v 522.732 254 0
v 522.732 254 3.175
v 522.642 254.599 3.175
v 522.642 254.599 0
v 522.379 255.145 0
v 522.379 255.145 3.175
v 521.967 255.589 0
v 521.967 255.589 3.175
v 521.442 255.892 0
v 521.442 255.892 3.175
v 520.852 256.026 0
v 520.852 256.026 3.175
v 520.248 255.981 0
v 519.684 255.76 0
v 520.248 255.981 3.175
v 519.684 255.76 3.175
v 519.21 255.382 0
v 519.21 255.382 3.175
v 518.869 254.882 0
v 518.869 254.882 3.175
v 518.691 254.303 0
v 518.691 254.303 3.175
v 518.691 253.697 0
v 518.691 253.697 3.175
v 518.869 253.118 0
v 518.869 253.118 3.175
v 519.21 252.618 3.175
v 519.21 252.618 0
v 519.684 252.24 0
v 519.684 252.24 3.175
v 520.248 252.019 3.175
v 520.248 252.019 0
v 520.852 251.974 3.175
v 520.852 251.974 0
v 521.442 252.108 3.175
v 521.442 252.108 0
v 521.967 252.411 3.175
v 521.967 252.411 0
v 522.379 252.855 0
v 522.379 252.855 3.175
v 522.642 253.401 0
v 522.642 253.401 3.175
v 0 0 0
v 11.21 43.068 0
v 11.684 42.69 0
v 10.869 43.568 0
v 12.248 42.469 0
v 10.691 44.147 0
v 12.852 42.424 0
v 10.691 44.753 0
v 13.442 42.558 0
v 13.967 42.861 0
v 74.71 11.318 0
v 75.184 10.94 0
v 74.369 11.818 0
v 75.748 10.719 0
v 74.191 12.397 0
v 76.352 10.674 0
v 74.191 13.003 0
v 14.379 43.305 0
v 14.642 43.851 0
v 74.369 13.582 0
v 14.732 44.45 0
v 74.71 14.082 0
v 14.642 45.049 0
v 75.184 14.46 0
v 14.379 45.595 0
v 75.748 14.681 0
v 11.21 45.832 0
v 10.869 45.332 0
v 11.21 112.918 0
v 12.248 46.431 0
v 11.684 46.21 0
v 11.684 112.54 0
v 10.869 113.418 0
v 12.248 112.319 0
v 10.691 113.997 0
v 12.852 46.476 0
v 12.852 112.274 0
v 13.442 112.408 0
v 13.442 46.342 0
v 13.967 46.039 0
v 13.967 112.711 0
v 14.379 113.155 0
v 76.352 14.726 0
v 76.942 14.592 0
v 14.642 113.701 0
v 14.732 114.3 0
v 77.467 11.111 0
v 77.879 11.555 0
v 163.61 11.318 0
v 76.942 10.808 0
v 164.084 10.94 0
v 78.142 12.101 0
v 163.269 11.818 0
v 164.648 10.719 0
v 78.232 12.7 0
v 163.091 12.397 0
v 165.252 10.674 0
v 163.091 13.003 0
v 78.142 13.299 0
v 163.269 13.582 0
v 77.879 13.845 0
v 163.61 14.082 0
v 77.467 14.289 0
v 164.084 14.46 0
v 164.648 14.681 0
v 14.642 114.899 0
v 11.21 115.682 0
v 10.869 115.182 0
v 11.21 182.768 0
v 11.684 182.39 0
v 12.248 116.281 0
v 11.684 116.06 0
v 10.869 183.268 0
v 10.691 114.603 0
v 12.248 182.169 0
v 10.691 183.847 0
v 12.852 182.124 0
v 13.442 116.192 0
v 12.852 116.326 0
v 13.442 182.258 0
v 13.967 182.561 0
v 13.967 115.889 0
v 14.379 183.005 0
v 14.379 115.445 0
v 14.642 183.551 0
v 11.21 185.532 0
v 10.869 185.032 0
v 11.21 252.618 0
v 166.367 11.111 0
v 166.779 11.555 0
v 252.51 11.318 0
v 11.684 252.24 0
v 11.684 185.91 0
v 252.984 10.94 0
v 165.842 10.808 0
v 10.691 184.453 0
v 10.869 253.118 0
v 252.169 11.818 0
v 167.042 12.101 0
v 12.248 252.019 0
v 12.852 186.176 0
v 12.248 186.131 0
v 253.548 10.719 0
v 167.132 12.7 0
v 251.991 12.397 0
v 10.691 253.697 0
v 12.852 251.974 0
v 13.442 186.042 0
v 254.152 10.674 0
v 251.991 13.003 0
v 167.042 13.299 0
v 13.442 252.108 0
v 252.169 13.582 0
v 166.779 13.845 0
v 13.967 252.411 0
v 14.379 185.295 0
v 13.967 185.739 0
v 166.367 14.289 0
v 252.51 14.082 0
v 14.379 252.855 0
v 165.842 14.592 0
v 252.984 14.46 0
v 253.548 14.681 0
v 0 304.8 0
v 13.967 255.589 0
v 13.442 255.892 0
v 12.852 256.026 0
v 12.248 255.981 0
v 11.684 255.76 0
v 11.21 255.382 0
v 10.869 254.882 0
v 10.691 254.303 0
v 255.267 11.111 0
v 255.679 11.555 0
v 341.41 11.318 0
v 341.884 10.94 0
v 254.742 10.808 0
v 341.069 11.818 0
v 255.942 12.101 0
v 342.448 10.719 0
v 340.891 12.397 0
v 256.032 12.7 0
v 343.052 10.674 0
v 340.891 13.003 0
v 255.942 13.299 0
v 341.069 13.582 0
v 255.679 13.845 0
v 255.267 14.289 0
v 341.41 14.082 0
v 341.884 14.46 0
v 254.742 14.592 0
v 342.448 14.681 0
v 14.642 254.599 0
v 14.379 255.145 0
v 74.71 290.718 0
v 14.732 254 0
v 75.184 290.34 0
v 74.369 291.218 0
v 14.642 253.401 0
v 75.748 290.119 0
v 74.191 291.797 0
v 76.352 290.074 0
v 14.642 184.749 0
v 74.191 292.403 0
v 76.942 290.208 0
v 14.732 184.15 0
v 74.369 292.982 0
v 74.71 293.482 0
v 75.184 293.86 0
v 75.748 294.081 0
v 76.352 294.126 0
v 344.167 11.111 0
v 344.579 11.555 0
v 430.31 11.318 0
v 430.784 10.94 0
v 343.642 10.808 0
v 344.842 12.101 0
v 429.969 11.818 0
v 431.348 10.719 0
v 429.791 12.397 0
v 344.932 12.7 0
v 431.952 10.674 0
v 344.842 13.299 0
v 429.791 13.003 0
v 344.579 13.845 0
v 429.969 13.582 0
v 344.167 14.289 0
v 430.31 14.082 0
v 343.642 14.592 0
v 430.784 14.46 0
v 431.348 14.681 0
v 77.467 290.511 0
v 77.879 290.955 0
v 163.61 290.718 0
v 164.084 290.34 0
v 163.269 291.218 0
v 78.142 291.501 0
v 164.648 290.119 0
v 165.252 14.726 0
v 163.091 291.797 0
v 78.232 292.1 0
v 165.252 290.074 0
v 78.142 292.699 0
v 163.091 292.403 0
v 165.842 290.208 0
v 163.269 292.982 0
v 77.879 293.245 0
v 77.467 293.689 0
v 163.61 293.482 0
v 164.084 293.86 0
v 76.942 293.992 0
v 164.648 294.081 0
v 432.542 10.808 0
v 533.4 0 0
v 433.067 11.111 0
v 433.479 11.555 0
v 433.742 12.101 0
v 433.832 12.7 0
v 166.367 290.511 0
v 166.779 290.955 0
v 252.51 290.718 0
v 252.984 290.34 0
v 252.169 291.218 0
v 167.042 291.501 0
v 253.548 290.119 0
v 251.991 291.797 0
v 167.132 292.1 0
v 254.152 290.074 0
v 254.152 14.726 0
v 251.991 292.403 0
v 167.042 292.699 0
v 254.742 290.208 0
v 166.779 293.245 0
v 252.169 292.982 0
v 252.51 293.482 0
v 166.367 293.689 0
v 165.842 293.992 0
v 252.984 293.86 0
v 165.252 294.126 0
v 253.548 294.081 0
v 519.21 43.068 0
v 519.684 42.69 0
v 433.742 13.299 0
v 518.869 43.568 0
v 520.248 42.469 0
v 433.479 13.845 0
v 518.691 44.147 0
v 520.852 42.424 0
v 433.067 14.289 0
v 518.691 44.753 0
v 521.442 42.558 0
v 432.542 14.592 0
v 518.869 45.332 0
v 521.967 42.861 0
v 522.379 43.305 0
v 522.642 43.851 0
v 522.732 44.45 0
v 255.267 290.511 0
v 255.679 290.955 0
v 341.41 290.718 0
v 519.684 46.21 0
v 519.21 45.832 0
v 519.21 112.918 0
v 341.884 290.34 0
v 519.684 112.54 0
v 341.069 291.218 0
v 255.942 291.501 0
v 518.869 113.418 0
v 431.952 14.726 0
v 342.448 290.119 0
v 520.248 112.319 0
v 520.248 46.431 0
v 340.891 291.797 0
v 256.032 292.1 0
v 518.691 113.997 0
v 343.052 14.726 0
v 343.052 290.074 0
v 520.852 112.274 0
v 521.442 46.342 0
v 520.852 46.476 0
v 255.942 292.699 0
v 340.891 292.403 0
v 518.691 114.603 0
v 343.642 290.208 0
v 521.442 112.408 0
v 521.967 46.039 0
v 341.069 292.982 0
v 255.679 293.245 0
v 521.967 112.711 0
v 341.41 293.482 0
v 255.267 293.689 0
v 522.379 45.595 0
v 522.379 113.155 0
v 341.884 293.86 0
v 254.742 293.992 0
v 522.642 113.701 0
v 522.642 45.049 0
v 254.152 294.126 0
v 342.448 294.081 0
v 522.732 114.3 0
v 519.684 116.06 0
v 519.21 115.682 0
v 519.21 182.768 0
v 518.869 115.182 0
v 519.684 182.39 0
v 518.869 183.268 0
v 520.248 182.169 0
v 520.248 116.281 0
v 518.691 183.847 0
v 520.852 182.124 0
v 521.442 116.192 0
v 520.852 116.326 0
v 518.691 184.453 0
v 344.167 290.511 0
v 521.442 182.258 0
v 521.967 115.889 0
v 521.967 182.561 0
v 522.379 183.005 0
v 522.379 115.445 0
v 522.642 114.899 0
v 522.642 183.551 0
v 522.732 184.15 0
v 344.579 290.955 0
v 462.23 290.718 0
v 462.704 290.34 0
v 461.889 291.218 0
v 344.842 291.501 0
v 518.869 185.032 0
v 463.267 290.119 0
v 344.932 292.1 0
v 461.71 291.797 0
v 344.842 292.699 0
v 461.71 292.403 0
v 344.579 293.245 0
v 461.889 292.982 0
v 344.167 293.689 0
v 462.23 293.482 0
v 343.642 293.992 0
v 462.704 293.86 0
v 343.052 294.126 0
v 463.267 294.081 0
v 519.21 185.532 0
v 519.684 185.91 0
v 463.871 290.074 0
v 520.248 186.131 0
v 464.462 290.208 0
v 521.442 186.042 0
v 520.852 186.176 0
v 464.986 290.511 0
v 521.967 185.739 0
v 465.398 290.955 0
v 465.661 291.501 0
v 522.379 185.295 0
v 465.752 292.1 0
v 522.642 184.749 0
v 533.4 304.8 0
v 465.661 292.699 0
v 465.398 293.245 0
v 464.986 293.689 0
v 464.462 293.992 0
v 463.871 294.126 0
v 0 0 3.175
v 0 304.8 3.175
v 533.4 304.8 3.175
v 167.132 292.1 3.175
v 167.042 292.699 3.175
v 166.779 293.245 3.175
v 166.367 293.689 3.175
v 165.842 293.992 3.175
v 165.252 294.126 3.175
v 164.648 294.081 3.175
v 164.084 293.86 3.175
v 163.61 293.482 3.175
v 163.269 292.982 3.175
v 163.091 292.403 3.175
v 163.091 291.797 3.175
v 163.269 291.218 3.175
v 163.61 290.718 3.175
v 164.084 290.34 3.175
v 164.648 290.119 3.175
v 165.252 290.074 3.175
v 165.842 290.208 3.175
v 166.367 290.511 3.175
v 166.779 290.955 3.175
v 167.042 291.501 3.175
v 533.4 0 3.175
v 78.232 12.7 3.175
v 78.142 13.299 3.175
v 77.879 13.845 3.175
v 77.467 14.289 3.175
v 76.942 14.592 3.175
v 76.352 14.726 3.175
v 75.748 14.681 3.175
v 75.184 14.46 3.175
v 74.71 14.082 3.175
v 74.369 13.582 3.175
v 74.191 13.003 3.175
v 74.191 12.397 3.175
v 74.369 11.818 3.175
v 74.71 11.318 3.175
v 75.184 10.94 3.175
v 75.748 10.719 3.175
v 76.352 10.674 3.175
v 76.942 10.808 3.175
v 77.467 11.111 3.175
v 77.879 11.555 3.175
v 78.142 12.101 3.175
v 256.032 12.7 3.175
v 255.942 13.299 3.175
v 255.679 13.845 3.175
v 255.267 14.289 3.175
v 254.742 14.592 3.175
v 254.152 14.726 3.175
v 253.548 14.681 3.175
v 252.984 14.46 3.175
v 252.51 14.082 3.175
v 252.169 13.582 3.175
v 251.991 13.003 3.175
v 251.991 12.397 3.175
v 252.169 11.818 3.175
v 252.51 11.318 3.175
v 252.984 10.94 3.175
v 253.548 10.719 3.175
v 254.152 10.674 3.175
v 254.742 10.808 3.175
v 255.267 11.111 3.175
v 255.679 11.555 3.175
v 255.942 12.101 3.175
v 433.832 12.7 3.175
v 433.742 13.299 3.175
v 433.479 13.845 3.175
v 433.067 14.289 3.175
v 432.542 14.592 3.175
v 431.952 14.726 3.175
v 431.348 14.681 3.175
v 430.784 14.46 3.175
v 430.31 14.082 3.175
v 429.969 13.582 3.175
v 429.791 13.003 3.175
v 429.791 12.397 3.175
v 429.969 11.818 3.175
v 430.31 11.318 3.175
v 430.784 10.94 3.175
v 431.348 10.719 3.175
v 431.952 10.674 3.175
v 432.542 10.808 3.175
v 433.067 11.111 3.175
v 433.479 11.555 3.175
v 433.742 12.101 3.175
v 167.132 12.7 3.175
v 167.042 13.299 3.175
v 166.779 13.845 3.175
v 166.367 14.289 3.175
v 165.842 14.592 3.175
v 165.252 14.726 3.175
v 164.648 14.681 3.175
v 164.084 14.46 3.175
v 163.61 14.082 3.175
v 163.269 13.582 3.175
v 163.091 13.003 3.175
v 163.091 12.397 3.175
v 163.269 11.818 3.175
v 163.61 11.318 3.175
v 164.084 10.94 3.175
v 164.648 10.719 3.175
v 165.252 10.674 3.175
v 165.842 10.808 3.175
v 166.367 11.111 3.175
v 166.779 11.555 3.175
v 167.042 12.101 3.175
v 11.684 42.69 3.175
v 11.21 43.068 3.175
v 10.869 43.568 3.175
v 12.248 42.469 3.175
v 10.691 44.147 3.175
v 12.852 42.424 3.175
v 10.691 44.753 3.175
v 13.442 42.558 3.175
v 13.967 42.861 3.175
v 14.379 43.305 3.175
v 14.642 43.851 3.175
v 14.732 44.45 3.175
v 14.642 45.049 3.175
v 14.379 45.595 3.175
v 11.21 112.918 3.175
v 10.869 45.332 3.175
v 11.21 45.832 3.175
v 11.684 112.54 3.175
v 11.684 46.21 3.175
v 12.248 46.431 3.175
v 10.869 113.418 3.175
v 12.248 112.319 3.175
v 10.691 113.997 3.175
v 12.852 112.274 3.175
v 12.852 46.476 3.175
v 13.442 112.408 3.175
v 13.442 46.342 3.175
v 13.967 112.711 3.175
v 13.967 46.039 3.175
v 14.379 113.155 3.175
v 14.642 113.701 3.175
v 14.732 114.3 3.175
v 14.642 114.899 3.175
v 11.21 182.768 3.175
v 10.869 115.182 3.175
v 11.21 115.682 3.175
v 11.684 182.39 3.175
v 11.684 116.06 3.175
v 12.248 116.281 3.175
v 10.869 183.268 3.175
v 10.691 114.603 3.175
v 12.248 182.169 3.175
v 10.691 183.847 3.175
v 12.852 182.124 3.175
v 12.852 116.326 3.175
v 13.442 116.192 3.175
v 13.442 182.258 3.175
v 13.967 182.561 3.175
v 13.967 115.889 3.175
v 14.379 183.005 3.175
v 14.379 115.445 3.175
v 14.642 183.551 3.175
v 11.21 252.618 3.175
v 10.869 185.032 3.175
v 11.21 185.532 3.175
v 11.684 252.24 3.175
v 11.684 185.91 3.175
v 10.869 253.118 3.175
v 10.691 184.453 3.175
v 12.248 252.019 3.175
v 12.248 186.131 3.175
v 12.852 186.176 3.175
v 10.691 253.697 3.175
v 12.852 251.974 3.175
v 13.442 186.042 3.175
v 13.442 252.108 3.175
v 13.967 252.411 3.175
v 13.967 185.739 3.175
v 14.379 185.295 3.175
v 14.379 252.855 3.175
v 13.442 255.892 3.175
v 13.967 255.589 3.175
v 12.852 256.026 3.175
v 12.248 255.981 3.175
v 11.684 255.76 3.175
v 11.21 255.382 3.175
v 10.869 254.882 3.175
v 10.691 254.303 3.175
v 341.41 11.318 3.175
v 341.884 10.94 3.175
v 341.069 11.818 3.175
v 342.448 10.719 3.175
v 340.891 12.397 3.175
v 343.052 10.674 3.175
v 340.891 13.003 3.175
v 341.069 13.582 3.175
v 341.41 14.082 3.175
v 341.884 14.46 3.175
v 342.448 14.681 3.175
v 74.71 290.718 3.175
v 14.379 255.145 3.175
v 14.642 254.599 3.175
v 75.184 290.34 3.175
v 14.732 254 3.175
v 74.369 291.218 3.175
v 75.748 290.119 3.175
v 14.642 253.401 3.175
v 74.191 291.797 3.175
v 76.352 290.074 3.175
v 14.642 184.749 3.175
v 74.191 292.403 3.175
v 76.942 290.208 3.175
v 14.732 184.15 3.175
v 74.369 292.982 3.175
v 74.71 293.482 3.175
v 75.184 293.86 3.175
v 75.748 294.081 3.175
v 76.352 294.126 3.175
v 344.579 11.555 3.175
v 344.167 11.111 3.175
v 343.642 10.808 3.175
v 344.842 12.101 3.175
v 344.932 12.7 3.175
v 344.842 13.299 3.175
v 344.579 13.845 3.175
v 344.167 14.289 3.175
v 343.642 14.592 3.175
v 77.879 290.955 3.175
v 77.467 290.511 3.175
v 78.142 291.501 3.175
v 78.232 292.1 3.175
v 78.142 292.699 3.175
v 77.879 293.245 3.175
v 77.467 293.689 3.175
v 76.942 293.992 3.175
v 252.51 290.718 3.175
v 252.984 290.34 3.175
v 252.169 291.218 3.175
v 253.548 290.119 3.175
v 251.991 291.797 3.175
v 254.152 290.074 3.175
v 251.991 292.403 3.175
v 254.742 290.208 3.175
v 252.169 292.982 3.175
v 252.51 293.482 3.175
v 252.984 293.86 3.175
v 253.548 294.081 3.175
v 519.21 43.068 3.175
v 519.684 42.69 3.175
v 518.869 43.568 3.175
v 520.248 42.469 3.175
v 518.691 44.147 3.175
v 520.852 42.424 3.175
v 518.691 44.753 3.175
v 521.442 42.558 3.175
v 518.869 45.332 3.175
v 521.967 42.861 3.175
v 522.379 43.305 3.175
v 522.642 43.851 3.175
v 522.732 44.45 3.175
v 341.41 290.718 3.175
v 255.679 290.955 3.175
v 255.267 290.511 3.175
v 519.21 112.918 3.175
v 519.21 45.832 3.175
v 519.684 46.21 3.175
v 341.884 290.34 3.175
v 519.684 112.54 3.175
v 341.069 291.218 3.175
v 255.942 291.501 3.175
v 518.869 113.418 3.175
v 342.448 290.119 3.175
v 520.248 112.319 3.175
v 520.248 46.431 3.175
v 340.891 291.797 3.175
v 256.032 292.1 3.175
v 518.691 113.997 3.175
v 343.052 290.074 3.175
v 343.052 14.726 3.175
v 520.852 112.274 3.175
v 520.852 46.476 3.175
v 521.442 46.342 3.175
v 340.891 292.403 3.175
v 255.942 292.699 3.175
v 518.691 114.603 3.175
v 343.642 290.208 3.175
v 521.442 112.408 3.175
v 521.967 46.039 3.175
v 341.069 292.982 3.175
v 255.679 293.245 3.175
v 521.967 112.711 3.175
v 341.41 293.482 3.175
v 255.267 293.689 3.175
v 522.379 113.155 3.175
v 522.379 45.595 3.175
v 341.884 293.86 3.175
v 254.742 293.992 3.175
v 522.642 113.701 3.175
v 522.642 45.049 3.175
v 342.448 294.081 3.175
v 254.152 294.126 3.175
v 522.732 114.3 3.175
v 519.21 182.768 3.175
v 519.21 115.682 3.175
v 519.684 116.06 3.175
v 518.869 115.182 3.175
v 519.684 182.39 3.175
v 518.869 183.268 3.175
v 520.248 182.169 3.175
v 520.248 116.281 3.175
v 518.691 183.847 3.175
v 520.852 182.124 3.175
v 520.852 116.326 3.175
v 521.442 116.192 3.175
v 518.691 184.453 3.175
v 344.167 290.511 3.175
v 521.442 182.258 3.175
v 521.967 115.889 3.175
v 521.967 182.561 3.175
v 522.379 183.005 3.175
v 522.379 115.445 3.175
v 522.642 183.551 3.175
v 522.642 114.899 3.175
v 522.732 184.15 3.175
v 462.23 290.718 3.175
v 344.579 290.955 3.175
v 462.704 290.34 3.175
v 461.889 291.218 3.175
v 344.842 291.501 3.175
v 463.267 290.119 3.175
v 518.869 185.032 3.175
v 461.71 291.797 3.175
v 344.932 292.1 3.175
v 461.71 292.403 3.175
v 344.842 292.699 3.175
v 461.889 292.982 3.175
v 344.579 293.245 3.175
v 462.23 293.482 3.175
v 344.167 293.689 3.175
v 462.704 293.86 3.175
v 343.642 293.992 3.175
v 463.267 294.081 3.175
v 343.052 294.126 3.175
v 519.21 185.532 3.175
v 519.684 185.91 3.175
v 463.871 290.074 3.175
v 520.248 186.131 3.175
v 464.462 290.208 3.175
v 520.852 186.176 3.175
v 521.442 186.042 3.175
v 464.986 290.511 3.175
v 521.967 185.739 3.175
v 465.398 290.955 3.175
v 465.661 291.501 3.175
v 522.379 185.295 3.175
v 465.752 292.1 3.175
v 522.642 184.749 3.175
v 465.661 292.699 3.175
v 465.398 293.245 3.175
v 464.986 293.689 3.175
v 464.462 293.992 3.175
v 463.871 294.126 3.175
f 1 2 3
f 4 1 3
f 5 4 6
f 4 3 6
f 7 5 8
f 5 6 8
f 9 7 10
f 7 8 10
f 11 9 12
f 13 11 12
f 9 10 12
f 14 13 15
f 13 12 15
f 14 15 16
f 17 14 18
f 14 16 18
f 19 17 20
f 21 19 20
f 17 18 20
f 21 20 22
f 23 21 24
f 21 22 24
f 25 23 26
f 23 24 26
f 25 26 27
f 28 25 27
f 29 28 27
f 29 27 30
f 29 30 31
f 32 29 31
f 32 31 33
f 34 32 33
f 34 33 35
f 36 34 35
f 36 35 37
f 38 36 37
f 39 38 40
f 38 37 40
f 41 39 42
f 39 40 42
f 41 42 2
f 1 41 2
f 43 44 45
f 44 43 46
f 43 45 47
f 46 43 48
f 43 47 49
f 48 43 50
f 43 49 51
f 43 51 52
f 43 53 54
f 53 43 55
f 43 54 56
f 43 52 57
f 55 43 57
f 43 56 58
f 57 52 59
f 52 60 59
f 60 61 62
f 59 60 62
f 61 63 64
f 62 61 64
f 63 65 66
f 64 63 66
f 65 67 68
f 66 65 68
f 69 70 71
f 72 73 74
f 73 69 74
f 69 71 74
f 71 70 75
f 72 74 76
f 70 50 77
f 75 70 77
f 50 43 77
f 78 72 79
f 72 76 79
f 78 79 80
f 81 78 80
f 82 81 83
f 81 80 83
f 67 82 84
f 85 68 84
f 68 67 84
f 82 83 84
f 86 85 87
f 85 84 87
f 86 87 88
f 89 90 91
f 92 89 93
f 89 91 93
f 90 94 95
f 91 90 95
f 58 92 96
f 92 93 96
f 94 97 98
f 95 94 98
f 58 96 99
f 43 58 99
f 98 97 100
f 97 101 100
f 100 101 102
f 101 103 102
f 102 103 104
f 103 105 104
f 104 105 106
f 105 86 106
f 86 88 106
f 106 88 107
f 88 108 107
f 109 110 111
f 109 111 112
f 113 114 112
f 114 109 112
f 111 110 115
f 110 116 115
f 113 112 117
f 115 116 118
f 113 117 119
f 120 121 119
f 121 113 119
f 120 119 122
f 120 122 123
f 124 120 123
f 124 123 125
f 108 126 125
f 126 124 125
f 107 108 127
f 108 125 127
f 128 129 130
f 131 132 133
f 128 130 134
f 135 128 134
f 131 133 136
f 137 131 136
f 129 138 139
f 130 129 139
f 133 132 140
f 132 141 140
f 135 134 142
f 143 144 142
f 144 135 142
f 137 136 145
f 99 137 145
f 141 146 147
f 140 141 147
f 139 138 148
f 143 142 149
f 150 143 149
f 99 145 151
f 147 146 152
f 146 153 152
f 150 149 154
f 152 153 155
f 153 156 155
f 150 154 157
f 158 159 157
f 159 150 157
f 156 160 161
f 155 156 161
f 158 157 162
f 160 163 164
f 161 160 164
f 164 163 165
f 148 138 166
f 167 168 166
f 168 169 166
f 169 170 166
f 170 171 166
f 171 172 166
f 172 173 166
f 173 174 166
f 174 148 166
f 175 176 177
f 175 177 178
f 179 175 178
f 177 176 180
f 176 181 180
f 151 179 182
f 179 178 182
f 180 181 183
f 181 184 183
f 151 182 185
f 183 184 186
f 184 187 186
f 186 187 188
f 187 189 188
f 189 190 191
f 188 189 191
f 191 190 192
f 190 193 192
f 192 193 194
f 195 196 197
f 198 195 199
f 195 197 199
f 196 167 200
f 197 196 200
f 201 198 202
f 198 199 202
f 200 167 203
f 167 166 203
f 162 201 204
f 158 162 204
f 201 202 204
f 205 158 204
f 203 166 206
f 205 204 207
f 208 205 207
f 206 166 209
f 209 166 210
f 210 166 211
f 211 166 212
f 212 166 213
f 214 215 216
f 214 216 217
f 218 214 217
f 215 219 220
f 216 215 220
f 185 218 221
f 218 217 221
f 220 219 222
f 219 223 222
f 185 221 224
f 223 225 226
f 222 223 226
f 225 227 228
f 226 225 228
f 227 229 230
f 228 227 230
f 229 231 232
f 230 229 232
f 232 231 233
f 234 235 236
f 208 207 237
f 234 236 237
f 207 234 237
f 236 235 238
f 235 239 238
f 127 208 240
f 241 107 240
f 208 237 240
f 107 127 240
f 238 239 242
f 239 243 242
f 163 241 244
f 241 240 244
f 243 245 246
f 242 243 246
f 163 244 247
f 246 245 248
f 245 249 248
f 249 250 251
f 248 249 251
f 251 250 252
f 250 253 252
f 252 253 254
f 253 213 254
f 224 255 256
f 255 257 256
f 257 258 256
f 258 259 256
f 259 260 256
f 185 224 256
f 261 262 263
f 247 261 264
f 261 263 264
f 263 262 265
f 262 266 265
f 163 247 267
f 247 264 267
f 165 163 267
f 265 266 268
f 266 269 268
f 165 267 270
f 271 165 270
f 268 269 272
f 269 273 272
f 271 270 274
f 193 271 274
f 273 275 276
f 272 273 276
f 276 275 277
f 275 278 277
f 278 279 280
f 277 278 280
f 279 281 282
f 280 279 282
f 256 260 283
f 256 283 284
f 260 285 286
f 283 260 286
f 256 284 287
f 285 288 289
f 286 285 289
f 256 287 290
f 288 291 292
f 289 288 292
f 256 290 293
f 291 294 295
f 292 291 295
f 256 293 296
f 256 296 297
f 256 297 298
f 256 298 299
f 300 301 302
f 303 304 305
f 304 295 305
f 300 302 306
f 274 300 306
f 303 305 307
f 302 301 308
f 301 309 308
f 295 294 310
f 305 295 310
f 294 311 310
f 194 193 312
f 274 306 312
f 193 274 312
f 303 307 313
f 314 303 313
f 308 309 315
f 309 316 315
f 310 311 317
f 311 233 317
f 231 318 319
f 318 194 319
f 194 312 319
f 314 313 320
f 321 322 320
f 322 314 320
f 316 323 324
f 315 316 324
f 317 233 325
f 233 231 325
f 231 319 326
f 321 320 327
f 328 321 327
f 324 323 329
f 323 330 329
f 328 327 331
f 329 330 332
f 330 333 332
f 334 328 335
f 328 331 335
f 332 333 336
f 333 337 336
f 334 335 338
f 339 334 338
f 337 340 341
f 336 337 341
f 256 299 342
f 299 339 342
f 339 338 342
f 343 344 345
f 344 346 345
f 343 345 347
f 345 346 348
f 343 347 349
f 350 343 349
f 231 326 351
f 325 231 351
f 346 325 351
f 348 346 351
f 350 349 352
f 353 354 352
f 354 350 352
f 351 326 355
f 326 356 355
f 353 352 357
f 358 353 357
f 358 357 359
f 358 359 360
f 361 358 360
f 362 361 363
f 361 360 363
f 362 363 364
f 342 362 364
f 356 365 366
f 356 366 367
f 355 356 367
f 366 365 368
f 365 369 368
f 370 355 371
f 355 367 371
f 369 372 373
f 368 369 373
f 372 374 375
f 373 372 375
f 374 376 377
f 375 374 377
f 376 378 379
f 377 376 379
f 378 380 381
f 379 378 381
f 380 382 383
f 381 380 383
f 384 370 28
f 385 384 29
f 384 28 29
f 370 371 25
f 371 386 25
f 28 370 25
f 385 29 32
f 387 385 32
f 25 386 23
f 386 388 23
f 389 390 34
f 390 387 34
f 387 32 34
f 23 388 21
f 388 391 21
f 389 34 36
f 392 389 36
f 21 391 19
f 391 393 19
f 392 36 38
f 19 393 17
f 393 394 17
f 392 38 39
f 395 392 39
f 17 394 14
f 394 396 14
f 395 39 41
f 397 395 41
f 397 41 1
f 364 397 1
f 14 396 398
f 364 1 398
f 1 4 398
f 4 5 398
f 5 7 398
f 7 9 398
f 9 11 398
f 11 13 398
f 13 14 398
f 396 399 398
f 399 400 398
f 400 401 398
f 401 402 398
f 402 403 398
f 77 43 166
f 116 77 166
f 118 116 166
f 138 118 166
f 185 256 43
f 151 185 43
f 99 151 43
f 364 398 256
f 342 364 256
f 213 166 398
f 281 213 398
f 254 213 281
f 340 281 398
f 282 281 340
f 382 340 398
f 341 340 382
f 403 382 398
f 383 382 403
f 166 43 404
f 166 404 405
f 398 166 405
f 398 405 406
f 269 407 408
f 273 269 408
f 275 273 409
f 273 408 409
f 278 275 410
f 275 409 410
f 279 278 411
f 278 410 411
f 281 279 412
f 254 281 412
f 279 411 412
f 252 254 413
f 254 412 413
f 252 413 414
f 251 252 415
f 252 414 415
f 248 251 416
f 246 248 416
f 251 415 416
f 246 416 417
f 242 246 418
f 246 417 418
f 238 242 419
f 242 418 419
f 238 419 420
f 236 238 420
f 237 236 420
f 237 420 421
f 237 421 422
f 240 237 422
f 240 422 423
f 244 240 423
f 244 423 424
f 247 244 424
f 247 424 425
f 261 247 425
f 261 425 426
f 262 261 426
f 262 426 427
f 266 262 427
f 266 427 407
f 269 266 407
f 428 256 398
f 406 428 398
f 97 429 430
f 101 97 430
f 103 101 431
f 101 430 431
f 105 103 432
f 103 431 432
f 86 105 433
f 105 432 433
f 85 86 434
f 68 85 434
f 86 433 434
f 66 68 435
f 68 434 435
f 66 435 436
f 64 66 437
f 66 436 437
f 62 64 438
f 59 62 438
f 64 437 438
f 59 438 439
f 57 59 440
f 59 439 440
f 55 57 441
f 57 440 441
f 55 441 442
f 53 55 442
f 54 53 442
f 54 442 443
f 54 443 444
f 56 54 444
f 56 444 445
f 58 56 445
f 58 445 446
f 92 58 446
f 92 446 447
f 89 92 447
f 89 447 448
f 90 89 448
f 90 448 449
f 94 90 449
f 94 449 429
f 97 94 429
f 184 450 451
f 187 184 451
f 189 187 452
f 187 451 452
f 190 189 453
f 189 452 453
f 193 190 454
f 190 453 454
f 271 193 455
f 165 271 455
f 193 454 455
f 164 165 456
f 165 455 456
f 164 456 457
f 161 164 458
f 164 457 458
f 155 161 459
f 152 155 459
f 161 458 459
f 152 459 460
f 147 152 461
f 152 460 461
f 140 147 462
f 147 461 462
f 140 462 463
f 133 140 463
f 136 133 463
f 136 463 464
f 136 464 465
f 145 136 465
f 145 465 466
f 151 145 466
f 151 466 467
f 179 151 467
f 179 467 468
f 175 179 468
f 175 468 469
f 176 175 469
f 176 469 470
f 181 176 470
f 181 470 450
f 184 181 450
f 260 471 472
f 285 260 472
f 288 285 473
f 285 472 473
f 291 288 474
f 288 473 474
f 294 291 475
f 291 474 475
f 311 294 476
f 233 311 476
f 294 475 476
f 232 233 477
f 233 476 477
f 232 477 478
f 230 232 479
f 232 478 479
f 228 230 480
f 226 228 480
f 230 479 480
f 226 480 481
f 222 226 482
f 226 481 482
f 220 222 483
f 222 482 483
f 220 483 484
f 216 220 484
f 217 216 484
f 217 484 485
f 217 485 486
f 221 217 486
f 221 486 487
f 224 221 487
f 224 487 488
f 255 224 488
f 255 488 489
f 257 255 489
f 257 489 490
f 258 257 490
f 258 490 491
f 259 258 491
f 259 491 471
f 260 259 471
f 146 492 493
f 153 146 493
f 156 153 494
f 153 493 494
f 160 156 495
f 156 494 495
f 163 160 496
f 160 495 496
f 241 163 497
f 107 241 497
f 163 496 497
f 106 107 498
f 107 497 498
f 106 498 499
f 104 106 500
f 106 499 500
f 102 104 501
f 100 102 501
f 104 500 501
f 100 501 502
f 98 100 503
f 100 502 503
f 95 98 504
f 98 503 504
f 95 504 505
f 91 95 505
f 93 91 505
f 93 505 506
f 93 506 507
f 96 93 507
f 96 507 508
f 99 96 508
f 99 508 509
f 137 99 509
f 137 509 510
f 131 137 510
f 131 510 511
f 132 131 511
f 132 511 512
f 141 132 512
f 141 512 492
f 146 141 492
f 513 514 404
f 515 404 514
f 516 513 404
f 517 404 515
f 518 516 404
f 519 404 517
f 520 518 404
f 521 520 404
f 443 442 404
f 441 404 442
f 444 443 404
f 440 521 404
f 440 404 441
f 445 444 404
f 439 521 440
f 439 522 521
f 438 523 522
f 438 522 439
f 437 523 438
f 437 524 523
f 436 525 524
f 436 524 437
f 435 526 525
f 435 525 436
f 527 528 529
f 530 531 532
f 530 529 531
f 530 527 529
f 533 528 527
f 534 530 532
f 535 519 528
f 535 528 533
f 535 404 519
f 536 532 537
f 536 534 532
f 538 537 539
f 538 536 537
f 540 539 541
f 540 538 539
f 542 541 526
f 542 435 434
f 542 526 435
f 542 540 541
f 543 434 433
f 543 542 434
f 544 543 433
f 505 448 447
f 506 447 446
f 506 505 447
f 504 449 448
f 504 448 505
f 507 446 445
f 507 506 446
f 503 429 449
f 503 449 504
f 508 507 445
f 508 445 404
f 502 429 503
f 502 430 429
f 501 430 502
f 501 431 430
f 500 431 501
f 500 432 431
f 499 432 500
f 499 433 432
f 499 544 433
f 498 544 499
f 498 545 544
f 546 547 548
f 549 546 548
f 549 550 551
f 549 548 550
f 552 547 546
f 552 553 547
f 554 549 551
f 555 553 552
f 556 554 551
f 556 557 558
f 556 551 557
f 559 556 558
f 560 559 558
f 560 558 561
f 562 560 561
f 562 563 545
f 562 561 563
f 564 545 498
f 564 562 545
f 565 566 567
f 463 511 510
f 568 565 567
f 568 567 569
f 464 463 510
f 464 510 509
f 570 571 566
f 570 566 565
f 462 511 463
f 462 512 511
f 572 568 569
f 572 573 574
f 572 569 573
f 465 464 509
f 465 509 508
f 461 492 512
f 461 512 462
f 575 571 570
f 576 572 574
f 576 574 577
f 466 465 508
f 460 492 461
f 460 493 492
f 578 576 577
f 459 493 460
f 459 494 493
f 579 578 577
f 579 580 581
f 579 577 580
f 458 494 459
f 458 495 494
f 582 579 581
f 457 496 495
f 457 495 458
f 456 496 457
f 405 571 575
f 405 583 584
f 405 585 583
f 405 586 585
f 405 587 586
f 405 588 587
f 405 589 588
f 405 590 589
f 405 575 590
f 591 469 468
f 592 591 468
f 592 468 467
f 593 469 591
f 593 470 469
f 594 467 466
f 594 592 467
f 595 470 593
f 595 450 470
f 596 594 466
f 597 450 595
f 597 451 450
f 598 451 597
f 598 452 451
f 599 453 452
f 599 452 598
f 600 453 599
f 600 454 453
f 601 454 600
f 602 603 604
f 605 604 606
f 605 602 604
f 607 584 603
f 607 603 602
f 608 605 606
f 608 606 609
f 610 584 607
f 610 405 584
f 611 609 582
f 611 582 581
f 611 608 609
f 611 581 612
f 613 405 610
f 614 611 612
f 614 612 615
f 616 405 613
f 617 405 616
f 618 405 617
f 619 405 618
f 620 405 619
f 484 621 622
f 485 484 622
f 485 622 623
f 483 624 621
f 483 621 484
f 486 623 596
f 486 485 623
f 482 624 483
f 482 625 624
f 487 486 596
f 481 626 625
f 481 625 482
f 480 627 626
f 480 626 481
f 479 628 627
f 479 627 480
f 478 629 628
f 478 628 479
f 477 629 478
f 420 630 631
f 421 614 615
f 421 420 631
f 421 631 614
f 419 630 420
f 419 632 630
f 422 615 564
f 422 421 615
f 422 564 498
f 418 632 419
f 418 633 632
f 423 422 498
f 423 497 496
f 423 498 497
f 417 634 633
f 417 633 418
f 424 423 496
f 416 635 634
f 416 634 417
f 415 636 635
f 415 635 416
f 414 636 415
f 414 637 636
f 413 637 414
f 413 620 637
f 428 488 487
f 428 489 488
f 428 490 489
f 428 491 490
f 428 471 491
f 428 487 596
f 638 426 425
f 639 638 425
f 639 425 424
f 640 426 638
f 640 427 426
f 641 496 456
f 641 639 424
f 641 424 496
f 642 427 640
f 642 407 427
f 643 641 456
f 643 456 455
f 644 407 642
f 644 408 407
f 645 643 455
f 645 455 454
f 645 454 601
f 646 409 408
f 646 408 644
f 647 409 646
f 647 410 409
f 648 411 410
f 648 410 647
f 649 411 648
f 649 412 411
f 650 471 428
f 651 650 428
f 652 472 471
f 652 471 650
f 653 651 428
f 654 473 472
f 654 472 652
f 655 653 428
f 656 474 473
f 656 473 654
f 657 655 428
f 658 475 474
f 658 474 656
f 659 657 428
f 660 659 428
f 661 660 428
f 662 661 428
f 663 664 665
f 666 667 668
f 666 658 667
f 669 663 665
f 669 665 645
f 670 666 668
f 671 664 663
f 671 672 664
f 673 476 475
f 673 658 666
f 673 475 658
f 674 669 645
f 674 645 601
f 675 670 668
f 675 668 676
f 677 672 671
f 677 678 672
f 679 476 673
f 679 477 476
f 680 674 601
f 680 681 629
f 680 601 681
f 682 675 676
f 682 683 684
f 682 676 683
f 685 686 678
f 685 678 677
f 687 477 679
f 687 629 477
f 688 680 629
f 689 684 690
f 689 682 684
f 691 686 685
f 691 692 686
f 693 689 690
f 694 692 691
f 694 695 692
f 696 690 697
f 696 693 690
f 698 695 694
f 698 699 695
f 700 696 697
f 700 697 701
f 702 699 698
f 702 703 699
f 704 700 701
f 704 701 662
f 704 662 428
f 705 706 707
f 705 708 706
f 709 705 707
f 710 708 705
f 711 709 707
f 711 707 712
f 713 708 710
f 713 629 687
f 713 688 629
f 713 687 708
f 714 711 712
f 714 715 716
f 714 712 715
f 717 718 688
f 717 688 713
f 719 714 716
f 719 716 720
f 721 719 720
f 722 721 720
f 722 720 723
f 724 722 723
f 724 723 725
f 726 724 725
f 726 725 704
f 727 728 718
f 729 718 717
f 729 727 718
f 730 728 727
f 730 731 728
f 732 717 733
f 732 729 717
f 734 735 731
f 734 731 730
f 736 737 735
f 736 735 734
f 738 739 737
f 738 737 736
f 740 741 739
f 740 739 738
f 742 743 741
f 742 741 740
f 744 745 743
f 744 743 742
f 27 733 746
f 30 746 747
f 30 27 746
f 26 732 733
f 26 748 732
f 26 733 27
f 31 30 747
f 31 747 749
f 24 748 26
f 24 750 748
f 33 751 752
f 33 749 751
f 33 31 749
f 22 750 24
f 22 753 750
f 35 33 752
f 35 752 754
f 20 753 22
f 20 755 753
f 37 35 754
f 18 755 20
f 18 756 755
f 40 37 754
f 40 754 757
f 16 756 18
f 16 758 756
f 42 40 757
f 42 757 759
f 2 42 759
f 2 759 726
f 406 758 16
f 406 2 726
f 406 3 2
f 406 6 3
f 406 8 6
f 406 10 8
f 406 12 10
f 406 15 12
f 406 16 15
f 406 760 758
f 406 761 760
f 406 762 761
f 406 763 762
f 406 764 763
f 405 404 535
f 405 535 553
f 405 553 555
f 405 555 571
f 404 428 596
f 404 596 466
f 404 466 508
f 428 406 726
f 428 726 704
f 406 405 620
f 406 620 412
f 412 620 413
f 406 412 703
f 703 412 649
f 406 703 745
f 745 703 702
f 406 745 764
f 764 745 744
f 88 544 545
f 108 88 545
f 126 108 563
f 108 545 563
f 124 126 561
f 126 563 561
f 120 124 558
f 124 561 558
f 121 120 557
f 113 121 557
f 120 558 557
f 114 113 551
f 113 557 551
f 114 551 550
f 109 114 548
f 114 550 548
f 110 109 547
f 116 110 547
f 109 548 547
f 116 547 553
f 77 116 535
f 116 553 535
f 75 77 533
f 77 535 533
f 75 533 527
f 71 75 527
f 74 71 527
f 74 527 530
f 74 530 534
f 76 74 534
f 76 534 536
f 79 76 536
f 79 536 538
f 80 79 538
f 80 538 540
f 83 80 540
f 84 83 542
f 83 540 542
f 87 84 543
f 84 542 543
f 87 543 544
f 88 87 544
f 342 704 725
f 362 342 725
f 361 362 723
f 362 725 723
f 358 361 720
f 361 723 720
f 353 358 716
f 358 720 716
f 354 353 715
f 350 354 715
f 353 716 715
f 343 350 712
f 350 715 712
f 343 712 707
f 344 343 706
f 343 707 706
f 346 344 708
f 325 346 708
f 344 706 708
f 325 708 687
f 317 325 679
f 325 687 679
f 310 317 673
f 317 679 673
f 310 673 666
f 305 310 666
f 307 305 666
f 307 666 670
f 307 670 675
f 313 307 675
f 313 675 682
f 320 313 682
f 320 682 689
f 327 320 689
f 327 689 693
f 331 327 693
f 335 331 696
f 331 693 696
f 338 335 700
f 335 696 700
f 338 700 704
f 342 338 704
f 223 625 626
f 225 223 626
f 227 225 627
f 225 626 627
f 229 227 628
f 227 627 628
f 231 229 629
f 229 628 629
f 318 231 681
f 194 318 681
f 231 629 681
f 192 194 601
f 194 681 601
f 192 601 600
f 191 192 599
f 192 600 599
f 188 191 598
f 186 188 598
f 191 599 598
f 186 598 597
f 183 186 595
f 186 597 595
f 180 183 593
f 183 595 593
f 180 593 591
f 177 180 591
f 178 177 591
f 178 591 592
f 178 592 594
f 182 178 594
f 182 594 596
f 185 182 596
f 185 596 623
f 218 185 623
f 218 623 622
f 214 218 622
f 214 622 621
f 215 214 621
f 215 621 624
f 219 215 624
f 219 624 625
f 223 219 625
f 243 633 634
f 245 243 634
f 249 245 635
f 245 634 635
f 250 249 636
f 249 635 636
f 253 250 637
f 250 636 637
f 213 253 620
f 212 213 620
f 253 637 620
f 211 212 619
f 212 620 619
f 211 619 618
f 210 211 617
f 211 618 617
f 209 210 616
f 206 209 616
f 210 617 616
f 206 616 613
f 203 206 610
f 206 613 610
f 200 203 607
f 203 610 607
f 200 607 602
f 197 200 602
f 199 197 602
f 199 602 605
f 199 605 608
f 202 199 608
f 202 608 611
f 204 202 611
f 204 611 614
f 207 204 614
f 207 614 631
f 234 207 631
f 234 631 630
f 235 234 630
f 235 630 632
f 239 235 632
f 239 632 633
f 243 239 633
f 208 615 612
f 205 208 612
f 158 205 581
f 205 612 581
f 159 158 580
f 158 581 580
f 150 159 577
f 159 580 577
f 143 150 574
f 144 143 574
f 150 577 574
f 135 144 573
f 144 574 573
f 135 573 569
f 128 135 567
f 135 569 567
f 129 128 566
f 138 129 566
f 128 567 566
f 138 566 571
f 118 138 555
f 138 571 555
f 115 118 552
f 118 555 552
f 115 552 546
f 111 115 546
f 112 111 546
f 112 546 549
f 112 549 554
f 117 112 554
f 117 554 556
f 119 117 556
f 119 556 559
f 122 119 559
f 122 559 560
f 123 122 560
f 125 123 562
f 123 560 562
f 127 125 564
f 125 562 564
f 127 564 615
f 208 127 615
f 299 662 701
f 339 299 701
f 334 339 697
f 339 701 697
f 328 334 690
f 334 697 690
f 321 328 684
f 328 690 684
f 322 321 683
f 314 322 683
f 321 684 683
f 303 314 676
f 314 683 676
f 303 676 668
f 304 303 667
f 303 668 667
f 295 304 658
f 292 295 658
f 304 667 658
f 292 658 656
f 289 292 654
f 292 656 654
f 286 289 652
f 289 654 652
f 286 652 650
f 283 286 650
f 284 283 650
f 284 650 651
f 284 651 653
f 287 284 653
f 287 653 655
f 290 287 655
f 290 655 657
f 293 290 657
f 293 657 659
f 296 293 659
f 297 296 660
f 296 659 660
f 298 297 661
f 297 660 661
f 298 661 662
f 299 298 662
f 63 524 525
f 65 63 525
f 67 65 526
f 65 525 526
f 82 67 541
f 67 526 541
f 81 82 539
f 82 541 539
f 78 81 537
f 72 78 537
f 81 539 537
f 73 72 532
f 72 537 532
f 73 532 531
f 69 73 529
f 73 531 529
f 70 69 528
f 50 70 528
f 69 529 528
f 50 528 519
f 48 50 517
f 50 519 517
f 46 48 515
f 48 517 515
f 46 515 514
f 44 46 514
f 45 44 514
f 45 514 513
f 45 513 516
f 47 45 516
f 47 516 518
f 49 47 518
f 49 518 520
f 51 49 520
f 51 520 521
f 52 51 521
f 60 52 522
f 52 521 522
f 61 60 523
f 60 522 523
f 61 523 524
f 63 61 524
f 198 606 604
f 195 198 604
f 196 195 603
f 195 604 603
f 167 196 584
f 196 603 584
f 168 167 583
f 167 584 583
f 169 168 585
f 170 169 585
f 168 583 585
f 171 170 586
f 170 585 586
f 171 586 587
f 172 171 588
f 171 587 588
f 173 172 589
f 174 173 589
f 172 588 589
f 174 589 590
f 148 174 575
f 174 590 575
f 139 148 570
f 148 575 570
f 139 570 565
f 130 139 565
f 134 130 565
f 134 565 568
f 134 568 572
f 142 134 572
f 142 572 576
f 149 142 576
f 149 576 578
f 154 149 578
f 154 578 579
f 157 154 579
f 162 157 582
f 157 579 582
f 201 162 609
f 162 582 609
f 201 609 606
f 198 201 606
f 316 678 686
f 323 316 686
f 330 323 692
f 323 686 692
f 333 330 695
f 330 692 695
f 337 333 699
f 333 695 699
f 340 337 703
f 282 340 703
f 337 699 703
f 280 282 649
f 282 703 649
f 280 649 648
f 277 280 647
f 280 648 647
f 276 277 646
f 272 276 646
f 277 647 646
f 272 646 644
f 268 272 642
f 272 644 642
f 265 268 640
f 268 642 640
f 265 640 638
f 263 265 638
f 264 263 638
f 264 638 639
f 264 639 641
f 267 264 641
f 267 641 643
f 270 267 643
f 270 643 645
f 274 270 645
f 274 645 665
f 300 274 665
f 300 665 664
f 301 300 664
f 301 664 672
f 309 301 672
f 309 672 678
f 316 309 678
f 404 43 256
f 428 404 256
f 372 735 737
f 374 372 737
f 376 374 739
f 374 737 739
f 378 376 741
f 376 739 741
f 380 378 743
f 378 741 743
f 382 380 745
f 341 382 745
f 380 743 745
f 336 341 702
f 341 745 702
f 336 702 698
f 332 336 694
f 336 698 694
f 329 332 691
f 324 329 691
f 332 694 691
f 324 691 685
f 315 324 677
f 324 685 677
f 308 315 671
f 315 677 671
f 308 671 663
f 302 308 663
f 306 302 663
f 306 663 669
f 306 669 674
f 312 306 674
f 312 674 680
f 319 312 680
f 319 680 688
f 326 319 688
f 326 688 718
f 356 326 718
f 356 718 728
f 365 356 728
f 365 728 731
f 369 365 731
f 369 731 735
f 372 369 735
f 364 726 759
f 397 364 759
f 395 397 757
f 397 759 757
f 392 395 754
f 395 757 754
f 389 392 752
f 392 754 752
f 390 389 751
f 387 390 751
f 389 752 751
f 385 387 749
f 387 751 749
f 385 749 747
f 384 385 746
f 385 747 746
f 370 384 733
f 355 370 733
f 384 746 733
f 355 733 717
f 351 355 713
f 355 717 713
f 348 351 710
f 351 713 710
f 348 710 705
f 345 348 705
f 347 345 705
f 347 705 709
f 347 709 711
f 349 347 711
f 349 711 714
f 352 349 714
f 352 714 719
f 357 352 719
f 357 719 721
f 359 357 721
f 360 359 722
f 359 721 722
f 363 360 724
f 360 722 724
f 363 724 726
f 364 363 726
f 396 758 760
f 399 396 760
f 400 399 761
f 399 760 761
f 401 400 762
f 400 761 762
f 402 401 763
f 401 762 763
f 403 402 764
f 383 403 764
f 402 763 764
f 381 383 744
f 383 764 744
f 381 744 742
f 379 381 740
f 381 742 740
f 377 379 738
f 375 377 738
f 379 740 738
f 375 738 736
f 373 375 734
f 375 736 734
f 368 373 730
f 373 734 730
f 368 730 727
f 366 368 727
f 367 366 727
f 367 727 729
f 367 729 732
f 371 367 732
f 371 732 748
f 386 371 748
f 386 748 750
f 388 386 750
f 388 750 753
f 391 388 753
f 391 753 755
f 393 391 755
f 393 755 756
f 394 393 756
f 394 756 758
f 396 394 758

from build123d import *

# Parameters (mm, degrees)
SKETCH1_W           = 533.4
SKETCH1_H           = 304.8
BOSS_EXTRUDE1_DEPTH = 3.175
SKETCH5_R           = 2.032
CUT_EXTRUDE4_DEPTH  = 4.175
SKETCH6_R           = 2.032
CUT_EXTRUDE5_DEPTH  = 3.175


with BuildPart() as part:
    # Sketch1 → Boss-Extrude1 (new body)
    with BuildSketch(Plane.XY):
        with Locations((266.7, 152.4)):
            Rectangle(SKETCH1_W, SKETCH1_H)
    extrude(amount=BOSS_EXTRUDE1_DEPTH)

    # Sketch5 → Cut-Extrude4 (cut, through all)
    with BuildSketch(Plane.XY.offset(3.175)):
        with Locations((76.2, 12.7)):
            Circle(SKETCH5_R)
        with Locations((165.1, 12.7)):
            Circle(SKETCH5_R)
        with Locations((254, 12.7)):
            Circle(SKETCH5_R)
        with Locations((342.9, 12.7)):
            Circle(SKETCH5_R)
        with Locations((431.8, 12.7)):
            Circle(SKETCH5_R)
        with Locations((342.9, 292.1)):
            Circle(SKETCH5_R)
        with Locations((254, 292.1)):
            Circle(SKETCH5_R)
        with Locations((165.1, 292.1)):
            Circle(SKETCH5_R)
        with Locations((76.2, 292.1)):
            Circle(SKETCH5_R)
        with Locations((463.719540129, 292.1)):
            Circle(SKETCH5_R)
    extrude(amount=-CUT_EXTRUDE4_DEPTH, mode=Mode.SUBTRACT)

    # Sketch6 → Cut-Extrude5 (cut)
    with BuildSketch(Plane.XY.offset(3.175)):
        with Locations((12.7, 254)):
            Circle(SKETCH6_R)
        with Locations((12.7, 184.15)):
            Circle(SKETCH6_R)
        with Locations((12.7, 114.3)):
            Circle(SKETCH6_R)
        with Locations((12.7, 44.45)):
            Circle(SKETCH6_R)
        with Locations((520.7, 44.45)):
            Circle(SKETCH6_R)
        with Locations((520.7, 114.3)):
            Circle(SKETCH6_R)
        with Locations((520.7, 184.15)):
            Circle(SKETCH6_R)
        with Locations((520.7, 254)):
            Circle(SKETCH6_R)
    extrude(amount=-CUT_EXTRUDE5_DEPTH, mode=Mode.SUBTRACT)


solid = part.part
